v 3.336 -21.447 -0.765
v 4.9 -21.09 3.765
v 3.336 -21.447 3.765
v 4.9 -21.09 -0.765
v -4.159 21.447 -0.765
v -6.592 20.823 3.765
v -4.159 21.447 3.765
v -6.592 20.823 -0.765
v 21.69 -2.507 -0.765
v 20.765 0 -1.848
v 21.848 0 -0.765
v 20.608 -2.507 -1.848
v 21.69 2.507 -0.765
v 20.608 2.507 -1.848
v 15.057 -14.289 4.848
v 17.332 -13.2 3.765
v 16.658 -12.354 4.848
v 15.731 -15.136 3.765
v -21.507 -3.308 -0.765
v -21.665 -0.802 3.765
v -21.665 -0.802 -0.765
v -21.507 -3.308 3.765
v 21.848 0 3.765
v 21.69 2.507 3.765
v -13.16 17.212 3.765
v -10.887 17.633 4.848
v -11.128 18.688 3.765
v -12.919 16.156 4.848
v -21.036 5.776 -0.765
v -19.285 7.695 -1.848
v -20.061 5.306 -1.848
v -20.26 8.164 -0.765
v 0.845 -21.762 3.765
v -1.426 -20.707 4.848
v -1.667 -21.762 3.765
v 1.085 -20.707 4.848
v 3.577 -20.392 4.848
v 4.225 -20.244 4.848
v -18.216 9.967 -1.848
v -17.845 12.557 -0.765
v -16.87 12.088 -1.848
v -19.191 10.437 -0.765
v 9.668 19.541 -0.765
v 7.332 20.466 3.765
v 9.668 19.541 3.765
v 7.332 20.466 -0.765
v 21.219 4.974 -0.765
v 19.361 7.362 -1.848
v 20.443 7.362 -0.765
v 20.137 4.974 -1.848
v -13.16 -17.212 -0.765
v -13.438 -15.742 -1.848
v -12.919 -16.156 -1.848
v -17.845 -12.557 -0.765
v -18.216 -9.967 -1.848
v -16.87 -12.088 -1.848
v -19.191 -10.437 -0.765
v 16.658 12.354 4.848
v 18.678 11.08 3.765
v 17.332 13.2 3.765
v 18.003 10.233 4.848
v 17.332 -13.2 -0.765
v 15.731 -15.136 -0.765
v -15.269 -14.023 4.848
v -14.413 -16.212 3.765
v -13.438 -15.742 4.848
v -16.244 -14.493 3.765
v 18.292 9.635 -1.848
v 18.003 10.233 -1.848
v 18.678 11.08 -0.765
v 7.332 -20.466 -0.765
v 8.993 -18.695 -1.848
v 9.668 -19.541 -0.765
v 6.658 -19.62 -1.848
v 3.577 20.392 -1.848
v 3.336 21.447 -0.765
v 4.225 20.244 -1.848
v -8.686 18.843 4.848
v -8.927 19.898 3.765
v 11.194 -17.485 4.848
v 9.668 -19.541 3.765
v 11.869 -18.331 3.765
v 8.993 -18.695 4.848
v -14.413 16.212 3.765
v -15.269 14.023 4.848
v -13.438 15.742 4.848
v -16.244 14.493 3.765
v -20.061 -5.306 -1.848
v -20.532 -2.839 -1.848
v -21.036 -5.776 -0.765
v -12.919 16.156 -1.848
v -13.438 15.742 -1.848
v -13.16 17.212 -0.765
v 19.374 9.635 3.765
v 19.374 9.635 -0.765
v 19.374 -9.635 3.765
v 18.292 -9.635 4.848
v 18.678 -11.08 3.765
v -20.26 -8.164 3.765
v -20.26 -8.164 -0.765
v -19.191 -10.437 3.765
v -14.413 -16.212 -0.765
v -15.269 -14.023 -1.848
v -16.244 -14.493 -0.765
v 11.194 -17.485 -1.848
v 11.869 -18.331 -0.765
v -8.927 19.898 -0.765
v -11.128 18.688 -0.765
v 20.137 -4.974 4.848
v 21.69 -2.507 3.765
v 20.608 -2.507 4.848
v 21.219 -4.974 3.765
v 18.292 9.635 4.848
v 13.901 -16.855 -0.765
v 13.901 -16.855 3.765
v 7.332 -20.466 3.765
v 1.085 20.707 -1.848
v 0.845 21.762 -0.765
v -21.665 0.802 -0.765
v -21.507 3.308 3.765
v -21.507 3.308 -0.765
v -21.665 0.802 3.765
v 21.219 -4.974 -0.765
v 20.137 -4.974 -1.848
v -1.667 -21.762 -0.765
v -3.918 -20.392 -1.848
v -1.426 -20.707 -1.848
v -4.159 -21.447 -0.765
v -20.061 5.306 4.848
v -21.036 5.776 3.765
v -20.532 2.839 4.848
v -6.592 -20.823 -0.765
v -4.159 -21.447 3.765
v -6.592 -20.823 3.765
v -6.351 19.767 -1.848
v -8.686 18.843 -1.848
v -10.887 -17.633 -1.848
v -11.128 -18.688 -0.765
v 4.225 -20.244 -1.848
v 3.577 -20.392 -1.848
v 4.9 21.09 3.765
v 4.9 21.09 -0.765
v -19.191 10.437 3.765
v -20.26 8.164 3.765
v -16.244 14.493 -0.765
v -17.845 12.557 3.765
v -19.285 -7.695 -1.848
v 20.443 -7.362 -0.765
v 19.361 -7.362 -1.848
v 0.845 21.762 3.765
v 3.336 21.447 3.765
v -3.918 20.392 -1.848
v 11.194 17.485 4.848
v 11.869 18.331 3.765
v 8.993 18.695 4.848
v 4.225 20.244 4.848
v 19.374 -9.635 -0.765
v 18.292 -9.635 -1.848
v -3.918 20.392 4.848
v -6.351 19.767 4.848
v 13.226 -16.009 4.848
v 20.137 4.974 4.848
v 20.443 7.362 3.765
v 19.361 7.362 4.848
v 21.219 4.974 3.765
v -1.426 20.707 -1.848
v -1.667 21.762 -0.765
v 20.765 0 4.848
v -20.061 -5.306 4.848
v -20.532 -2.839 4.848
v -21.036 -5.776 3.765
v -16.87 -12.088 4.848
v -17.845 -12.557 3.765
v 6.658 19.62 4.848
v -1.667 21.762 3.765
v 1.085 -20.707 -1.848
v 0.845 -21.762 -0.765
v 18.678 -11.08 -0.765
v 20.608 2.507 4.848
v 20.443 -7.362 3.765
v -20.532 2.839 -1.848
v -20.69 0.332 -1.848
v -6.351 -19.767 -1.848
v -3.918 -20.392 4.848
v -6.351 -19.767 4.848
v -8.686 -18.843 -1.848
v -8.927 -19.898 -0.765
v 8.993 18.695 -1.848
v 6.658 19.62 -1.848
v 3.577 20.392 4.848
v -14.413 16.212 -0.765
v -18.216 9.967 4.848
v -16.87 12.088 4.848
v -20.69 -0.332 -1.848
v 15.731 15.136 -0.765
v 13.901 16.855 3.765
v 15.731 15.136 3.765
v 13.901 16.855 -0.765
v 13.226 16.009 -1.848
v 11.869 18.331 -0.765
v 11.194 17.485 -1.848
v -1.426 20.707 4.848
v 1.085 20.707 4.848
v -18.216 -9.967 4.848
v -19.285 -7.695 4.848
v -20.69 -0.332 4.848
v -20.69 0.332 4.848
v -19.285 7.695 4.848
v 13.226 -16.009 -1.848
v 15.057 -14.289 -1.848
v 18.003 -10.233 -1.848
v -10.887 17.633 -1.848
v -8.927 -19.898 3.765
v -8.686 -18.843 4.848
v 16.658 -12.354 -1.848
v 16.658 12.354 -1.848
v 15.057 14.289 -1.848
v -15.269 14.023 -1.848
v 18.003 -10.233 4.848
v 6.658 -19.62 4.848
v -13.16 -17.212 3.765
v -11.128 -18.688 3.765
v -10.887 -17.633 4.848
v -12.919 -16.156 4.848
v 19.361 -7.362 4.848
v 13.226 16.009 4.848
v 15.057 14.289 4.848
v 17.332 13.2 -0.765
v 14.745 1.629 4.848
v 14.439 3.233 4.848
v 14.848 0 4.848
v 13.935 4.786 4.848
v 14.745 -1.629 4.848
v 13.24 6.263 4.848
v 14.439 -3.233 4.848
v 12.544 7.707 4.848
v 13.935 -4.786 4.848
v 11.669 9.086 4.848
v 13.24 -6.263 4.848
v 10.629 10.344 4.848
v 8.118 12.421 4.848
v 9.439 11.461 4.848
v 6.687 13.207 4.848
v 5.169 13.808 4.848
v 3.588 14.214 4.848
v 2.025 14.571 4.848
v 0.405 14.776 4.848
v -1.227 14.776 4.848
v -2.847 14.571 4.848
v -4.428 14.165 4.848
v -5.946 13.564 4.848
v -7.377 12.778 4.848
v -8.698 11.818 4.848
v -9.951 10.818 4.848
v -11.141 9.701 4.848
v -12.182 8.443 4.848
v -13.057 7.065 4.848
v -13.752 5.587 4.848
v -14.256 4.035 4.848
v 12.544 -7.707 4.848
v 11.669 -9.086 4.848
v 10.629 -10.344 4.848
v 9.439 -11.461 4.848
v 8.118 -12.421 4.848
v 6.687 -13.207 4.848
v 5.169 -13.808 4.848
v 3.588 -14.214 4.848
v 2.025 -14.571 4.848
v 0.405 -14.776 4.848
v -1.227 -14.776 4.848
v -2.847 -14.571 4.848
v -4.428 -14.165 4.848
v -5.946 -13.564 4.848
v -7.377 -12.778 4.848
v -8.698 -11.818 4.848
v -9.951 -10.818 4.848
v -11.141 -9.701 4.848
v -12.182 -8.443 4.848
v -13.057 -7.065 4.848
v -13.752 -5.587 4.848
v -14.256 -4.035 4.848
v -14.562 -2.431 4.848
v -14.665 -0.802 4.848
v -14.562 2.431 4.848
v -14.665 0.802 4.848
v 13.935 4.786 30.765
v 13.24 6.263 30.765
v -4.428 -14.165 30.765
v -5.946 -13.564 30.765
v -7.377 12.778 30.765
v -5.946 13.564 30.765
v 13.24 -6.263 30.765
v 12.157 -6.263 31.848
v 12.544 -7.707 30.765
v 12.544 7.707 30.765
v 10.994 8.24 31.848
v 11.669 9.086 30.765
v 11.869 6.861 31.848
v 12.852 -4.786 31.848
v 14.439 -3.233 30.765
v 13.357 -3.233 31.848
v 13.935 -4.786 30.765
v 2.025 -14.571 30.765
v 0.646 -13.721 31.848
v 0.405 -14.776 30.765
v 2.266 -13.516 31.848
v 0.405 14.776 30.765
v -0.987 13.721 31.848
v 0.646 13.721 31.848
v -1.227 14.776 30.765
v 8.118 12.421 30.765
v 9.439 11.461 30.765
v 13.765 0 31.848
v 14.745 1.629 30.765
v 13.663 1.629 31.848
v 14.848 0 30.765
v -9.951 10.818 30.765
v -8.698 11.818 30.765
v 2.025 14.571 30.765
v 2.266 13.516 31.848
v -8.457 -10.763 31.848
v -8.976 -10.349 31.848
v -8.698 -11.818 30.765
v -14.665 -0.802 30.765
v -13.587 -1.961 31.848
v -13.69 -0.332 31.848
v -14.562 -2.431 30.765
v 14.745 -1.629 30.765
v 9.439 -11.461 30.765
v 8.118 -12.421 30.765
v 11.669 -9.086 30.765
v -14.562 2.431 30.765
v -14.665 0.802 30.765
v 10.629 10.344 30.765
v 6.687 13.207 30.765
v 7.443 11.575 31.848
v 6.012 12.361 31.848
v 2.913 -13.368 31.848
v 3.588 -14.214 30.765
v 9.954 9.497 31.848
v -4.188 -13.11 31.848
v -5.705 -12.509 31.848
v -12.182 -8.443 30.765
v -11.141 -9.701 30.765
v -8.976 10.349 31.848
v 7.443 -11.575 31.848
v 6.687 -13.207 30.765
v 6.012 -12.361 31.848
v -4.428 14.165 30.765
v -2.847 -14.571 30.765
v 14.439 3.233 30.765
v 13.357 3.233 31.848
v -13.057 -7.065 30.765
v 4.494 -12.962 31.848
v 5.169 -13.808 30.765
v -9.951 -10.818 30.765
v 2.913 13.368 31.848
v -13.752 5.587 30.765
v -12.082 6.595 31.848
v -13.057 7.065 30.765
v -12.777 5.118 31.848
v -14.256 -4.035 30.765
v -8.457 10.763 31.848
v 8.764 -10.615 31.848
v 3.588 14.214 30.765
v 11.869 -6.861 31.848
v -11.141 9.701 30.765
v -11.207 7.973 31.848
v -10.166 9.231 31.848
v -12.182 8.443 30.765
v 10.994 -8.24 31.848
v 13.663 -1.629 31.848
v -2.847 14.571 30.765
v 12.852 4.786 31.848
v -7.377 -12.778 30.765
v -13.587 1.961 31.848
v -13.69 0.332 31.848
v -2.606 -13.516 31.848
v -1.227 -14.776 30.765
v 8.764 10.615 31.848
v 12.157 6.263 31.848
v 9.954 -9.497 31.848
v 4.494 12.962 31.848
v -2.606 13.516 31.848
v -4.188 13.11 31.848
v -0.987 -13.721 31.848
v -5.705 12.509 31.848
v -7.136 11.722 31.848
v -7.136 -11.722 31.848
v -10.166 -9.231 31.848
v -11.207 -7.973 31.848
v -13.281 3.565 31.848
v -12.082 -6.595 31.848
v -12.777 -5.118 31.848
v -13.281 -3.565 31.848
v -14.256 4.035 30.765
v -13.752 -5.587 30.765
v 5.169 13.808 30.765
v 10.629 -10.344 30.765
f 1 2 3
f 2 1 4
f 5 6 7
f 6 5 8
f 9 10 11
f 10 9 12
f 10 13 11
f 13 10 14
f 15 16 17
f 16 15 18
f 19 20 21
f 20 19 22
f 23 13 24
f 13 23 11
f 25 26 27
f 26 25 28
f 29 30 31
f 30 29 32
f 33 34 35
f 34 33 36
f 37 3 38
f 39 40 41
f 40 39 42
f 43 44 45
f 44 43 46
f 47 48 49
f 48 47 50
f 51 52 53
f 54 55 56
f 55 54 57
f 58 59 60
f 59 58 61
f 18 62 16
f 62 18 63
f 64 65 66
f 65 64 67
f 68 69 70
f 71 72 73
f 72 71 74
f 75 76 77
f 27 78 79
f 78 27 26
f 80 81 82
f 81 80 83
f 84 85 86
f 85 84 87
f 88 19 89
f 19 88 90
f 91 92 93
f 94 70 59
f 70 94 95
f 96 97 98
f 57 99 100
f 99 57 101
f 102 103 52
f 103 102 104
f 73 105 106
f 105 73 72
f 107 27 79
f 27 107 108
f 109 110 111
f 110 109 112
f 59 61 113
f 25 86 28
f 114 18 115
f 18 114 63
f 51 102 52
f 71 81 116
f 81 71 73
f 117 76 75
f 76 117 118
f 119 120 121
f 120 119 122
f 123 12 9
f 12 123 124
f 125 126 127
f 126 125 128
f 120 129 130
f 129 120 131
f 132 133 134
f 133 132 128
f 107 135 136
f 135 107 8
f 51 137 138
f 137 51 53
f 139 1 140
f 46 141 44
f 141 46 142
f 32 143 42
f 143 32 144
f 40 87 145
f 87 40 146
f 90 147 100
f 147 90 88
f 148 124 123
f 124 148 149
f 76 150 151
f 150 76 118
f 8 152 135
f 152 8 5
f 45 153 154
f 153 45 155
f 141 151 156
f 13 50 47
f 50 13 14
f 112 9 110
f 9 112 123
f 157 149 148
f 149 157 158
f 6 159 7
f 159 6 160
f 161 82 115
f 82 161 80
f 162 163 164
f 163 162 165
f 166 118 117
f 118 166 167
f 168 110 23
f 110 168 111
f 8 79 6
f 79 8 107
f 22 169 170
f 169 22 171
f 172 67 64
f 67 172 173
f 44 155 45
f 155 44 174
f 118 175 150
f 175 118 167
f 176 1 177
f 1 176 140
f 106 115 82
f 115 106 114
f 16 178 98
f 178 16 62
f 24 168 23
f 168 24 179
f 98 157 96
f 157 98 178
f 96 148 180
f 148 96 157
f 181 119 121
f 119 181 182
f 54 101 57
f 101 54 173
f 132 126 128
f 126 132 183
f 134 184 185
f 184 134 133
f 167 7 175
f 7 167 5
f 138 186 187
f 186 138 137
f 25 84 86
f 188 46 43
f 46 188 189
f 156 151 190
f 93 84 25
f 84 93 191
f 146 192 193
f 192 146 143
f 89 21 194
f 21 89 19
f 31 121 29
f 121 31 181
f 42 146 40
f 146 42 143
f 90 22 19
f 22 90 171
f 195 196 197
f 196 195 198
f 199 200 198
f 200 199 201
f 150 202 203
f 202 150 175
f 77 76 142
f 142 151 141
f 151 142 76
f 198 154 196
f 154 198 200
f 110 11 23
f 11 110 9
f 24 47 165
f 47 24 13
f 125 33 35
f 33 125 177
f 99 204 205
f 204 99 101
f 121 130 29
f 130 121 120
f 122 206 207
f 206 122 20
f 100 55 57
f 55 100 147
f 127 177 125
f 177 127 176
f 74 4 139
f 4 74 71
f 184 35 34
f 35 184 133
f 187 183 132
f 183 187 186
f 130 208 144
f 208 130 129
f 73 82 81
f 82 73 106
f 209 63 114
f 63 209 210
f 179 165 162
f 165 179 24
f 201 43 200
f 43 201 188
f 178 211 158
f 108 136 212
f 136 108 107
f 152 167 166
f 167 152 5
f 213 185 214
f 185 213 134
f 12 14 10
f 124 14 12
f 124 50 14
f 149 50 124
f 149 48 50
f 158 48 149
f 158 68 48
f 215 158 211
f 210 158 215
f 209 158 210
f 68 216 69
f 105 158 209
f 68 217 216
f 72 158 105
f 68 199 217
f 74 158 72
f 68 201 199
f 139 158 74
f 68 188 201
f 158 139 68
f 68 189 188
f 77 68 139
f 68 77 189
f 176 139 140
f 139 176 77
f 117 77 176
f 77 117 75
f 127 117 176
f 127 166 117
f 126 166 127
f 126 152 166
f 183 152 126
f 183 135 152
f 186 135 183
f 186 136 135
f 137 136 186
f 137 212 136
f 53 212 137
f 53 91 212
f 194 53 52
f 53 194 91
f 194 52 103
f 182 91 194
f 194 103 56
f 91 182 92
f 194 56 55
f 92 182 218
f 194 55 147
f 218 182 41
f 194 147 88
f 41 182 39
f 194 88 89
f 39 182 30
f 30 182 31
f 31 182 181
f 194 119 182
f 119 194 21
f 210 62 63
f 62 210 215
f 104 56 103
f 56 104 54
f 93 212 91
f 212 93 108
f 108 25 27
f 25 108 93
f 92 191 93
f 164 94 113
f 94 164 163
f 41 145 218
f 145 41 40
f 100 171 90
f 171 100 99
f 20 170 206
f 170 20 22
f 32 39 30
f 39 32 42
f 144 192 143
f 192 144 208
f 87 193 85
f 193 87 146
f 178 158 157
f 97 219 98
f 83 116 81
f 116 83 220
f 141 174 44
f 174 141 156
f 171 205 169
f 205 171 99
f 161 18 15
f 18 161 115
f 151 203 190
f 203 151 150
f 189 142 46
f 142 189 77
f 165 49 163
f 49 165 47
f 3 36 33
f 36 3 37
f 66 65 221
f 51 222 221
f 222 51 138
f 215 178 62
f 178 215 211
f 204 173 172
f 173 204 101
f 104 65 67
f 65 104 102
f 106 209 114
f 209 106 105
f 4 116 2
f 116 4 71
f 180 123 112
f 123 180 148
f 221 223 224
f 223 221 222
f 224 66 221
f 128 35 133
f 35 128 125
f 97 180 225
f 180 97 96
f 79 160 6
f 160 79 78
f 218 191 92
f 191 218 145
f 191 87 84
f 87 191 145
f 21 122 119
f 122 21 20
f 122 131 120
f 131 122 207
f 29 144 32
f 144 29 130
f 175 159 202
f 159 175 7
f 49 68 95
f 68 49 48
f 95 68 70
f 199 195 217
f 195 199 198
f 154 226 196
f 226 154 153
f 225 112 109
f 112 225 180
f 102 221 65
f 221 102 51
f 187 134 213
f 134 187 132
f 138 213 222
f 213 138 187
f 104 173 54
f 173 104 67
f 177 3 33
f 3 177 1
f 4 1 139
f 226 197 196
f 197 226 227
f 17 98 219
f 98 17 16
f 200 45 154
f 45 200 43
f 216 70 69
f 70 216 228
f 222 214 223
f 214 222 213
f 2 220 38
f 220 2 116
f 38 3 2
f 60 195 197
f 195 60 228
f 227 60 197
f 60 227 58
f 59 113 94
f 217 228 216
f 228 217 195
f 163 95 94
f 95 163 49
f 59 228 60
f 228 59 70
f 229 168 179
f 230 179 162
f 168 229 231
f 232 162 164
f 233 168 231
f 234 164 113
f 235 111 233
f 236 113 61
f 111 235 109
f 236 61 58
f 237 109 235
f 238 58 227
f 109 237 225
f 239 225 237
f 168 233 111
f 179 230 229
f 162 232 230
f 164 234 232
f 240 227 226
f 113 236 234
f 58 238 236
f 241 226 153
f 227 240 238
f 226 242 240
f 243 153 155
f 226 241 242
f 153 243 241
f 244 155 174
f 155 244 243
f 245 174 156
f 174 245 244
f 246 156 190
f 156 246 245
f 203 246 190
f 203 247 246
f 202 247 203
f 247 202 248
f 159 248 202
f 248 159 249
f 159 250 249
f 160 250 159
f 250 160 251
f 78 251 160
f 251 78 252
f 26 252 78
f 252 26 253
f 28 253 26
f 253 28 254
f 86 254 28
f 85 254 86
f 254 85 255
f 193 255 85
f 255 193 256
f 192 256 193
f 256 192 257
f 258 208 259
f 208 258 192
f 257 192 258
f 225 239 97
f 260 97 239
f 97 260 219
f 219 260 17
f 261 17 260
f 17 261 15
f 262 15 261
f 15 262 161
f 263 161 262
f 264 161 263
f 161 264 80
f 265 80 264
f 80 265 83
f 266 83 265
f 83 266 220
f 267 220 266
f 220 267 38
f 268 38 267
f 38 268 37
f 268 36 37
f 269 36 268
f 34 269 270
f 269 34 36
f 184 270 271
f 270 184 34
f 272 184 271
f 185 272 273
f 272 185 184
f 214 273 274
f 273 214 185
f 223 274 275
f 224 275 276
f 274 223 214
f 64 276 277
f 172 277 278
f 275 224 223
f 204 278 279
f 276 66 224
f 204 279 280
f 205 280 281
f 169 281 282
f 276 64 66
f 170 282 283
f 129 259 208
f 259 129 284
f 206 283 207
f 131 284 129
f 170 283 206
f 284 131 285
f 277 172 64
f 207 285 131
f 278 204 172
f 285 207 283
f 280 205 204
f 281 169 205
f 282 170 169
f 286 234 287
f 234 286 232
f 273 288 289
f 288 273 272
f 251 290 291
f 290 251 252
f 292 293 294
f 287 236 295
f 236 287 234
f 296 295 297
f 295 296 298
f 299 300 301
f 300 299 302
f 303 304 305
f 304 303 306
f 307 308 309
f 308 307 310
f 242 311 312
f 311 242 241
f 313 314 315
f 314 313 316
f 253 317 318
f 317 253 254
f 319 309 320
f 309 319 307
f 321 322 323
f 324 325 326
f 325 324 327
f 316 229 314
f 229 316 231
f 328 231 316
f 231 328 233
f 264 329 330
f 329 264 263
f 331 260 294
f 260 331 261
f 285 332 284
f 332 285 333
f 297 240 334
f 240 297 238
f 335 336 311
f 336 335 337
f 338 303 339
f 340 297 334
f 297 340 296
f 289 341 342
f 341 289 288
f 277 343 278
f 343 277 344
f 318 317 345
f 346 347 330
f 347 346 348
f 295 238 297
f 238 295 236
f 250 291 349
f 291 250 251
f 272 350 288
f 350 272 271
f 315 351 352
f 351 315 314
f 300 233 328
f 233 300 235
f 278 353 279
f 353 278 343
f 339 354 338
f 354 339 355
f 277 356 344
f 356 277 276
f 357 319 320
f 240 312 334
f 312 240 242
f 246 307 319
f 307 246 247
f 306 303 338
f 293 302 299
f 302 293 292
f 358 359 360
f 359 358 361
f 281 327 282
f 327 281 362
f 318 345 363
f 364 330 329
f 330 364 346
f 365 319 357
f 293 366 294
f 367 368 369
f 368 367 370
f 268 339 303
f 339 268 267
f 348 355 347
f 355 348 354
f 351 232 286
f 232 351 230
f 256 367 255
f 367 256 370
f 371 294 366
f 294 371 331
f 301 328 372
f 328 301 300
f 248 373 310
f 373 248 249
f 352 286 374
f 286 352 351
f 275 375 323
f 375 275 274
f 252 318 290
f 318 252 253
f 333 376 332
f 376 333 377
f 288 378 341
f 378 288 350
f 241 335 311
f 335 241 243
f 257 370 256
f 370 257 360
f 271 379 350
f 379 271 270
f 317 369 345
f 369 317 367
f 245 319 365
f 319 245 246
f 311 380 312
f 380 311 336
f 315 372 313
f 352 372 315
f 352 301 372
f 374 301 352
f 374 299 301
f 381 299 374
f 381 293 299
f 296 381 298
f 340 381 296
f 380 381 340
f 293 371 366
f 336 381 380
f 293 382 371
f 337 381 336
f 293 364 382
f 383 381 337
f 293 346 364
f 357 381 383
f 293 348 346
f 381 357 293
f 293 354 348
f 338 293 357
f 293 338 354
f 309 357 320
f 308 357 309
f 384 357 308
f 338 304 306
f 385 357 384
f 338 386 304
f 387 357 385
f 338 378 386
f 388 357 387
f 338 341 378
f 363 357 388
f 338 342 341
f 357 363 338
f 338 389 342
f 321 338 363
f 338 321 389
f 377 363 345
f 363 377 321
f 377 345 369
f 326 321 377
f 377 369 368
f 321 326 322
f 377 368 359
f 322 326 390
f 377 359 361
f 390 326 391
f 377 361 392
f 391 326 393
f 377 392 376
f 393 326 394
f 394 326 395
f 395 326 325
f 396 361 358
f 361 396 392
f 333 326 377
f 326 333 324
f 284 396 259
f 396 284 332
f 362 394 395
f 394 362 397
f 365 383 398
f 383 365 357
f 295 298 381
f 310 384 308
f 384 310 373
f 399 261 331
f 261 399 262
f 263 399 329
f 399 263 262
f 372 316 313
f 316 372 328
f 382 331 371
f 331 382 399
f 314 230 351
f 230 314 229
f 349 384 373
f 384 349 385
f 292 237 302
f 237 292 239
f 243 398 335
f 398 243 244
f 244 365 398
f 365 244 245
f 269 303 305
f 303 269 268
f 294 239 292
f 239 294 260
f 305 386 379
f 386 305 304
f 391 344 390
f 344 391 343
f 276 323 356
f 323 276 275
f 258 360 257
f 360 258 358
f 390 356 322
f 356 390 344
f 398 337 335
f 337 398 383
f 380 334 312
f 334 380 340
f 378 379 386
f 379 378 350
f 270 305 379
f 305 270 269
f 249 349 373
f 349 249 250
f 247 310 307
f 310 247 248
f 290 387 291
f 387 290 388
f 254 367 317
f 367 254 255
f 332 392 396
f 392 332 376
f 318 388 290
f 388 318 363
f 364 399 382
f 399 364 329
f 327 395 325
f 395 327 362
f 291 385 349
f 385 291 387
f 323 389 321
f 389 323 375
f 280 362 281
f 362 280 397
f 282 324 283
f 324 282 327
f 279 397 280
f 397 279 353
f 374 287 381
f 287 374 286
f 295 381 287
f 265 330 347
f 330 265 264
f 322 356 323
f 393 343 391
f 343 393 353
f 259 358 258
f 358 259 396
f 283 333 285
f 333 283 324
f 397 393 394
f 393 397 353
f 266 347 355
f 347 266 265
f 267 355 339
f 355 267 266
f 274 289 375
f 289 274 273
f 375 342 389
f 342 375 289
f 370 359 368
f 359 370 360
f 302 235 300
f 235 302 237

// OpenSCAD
minkowski() {
  union() {
    cylinder(3, 20, 20, $fn=50);
    cylinder(30, 13, 13, $fn=50);
  }
  sphere(2);
}
